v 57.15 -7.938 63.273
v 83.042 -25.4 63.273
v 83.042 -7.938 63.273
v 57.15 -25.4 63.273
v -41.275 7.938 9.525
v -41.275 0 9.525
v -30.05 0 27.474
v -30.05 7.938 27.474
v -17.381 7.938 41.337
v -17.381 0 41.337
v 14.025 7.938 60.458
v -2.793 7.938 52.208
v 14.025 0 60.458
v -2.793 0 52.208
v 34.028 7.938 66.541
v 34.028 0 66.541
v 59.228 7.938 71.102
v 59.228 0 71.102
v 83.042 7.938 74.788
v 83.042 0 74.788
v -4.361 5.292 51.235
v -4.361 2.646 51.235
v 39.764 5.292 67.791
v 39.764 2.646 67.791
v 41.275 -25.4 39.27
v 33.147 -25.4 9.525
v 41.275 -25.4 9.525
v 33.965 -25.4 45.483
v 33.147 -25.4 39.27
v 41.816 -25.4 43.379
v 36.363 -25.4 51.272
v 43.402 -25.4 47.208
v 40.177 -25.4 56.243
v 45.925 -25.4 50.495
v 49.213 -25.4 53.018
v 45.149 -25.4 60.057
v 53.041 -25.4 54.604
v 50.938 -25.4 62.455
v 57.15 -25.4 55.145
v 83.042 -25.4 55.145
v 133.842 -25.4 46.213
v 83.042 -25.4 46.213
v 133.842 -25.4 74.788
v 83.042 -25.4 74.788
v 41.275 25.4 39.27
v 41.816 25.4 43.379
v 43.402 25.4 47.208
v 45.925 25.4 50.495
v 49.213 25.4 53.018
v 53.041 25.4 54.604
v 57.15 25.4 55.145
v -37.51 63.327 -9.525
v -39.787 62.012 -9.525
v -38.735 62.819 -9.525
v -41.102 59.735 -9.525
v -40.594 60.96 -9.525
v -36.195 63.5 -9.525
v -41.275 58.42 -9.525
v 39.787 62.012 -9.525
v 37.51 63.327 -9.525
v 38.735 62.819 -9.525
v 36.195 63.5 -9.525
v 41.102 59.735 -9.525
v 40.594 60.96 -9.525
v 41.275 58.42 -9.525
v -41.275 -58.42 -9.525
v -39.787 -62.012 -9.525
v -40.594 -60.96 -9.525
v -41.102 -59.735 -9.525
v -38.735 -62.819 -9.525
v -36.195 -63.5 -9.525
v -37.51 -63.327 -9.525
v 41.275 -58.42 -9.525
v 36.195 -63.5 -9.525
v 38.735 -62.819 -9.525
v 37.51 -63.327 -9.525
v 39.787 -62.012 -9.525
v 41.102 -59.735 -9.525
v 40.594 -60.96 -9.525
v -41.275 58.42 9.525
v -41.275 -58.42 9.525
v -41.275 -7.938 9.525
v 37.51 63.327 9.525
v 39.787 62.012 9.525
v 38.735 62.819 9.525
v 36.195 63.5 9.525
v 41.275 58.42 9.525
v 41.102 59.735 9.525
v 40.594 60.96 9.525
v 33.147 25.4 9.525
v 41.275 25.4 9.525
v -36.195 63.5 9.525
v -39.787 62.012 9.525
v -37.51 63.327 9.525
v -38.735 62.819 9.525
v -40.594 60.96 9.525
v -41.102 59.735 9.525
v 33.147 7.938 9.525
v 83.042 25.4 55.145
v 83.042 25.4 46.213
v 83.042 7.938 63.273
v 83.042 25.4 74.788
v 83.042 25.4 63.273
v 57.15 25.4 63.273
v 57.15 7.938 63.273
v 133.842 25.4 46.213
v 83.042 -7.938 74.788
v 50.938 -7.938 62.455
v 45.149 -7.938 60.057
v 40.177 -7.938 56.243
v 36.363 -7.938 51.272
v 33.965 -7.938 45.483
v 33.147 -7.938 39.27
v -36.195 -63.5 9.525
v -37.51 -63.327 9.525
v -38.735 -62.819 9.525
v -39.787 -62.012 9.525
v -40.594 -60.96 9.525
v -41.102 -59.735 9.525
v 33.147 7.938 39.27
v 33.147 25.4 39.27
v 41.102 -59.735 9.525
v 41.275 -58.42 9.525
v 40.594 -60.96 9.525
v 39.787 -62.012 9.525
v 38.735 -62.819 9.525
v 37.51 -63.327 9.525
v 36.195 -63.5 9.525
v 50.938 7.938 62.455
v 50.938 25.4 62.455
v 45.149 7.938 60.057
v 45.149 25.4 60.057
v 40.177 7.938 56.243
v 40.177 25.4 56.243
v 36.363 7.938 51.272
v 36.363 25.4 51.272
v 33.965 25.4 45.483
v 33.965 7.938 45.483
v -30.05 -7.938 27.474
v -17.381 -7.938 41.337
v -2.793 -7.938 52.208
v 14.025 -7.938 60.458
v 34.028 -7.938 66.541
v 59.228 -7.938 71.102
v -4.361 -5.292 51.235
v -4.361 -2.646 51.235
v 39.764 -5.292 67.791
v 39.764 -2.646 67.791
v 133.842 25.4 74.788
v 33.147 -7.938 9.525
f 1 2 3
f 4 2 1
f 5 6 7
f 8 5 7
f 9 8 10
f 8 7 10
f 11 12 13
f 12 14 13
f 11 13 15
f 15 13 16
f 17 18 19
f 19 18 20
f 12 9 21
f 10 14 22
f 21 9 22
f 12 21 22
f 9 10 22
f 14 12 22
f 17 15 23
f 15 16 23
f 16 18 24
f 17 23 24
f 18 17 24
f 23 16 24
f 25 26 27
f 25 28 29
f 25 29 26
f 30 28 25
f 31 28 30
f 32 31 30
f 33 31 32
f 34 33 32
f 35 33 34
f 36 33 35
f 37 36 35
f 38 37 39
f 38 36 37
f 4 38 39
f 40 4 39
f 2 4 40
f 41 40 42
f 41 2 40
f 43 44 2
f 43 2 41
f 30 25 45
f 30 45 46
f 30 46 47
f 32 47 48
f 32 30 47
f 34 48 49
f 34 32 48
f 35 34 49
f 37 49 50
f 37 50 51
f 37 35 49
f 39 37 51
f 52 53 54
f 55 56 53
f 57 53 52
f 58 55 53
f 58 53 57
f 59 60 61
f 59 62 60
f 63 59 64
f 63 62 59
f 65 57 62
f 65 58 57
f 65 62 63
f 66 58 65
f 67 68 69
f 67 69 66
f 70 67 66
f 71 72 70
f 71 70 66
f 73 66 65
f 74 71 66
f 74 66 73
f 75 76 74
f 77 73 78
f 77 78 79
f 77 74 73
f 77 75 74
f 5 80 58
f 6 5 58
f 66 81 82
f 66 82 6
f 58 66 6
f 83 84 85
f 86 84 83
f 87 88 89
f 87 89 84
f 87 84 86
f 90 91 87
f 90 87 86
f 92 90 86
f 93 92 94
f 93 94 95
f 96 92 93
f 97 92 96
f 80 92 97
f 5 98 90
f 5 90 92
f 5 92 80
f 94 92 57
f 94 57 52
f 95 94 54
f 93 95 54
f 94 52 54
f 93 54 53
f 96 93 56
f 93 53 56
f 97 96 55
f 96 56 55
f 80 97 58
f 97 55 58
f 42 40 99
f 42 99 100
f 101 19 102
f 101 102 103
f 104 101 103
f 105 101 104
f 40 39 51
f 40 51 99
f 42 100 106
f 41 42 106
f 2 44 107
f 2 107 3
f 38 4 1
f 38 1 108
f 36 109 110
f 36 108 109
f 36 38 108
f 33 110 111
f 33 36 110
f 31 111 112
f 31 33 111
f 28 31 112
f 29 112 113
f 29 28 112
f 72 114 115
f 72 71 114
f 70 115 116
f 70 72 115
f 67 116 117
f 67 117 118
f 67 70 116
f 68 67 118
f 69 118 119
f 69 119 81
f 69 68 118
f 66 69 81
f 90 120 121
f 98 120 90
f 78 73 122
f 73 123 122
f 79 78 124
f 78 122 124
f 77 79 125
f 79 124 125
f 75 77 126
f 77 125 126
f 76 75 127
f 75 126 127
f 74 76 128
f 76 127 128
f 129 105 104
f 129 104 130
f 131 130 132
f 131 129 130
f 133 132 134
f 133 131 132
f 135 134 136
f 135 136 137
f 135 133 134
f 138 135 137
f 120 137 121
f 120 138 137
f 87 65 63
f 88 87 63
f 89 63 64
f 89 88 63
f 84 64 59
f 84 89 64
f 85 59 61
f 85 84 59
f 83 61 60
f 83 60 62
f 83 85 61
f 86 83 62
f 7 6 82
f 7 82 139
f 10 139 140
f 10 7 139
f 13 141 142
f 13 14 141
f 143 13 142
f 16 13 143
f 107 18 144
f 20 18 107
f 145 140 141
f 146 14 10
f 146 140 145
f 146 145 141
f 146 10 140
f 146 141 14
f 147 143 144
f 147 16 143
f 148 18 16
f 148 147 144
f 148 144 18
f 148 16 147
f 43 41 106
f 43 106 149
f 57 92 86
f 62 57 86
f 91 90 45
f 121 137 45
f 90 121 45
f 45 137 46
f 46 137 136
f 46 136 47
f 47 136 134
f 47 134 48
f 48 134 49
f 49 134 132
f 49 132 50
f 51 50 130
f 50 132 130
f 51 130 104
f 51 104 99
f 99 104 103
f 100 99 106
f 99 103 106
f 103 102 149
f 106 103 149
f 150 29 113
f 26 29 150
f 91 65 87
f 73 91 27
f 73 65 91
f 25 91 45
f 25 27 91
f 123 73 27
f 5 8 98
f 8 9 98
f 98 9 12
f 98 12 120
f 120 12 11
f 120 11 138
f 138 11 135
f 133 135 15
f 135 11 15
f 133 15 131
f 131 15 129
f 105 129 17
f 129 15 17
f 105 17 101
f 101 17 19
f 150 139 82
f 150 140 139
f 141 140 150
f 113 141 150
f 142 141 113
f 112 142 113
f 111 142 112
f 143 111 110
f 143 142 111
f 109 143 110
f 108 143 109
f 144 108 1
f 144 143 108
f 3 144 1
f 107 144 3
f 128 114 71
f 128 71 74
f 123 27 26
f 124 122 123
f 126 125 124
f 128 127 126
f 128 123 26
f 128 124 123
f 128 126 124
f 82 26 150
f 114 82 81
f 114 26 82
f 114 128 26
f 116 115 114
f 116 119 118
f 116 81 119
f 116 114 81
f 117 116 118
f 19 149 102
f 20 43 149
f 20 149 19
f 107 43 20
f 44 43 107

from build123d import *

# Parameters (mm, degrees)
F1_DEPTH = 63.5
F2_DEPTH = 25.4
F3_DEPTH = 7.9375
F4_R     = 5.08


with BuildPart() as f1:
    # F0 (on Front) → F1 (new body, symmetric)
    with BuildSketch(Plane.XZ):
        Polygon((41.275, -9.525), (41.275, 9.525), (33.147, 9.525), (-41.275, 9.525), (-41.275, -9.525), align=None)
    extrude(amount=F1_DEPTH, both=True)

    # F0 (on Front) → F2 (join, symmetric)
    with BuildSketch(Plane.XZ):
        with BuildLine():
            Line((33.147, 9.525), (41.275, 9.525))
            Line((41.275, 9.525), (41.275, 39.270175))
            ThreePointArc((41.275, 39.270175), (45.92468, 50.495495), (57.15, 55.145175))
            Line((57.15, 55.145175), (83.04214, 55.145175))
            Line((83.04214, 55.145175), (83.04214, 63.273175))
            Line((83.04214, 63.273175), (57.15, 63.273175))
            ThreePointArc((57.15, 63.273175), (40.177316, 56.242859), (33.147, 39.270175))
            Line((33.147, 39.270175), (33.147, 9.525))
        make_face()
        Polygon((133.84214, 74.787841), (83.04214, 74.787841), (83.04214, 63.273175), (83.04214, 55.145175), (83.04214, 46.212841), (133.84214, 46.212841), align=None)
    extrude(amount=F2_DEPTH, both=True)

    # F0 (on Front) → F3 (join, symmetric)
    with BuildSketch(Plane.XZ):
        with BuildLine():
            Line((-41.275, 9.525), (33.147, 9.525))
            Line((33.147, 9.525), (33.147, 39.270175))
            ThreePointArc((33.147, 39.270175), (40.177316, 56.242859), (57.15, 63.273175))
            Line((57.15, 63.273175), (83.04214, 63.273175))
            Line((83.04214, 63.273175), (83.04214, 74.787841))
            add(Edge.make_bspline(
                [(-41.275, 9.525), (-10.652266, 69.008738), (42.873295, 67.373856), (83.04214, 74.787841)],
                knots=[0, 0, 0, 0, 140.406516, 140.406516, 140.406516, 140.406516], degree=3))
        make_face()
    extrude(amount=F3_DEPTH, both=True)

    # F4
    f4_edges = [f1.edges().sort_by_distance(p)[0] for p in [
        (-41.275, -63.5, 0),
        (41.275, -63.5, 0),
        (41.275, 63.5, 0),
        (-41.275, 63.5, 0),
    ]]
    fillet(f4_edges, radius=F4_R)


solid = f1.part
